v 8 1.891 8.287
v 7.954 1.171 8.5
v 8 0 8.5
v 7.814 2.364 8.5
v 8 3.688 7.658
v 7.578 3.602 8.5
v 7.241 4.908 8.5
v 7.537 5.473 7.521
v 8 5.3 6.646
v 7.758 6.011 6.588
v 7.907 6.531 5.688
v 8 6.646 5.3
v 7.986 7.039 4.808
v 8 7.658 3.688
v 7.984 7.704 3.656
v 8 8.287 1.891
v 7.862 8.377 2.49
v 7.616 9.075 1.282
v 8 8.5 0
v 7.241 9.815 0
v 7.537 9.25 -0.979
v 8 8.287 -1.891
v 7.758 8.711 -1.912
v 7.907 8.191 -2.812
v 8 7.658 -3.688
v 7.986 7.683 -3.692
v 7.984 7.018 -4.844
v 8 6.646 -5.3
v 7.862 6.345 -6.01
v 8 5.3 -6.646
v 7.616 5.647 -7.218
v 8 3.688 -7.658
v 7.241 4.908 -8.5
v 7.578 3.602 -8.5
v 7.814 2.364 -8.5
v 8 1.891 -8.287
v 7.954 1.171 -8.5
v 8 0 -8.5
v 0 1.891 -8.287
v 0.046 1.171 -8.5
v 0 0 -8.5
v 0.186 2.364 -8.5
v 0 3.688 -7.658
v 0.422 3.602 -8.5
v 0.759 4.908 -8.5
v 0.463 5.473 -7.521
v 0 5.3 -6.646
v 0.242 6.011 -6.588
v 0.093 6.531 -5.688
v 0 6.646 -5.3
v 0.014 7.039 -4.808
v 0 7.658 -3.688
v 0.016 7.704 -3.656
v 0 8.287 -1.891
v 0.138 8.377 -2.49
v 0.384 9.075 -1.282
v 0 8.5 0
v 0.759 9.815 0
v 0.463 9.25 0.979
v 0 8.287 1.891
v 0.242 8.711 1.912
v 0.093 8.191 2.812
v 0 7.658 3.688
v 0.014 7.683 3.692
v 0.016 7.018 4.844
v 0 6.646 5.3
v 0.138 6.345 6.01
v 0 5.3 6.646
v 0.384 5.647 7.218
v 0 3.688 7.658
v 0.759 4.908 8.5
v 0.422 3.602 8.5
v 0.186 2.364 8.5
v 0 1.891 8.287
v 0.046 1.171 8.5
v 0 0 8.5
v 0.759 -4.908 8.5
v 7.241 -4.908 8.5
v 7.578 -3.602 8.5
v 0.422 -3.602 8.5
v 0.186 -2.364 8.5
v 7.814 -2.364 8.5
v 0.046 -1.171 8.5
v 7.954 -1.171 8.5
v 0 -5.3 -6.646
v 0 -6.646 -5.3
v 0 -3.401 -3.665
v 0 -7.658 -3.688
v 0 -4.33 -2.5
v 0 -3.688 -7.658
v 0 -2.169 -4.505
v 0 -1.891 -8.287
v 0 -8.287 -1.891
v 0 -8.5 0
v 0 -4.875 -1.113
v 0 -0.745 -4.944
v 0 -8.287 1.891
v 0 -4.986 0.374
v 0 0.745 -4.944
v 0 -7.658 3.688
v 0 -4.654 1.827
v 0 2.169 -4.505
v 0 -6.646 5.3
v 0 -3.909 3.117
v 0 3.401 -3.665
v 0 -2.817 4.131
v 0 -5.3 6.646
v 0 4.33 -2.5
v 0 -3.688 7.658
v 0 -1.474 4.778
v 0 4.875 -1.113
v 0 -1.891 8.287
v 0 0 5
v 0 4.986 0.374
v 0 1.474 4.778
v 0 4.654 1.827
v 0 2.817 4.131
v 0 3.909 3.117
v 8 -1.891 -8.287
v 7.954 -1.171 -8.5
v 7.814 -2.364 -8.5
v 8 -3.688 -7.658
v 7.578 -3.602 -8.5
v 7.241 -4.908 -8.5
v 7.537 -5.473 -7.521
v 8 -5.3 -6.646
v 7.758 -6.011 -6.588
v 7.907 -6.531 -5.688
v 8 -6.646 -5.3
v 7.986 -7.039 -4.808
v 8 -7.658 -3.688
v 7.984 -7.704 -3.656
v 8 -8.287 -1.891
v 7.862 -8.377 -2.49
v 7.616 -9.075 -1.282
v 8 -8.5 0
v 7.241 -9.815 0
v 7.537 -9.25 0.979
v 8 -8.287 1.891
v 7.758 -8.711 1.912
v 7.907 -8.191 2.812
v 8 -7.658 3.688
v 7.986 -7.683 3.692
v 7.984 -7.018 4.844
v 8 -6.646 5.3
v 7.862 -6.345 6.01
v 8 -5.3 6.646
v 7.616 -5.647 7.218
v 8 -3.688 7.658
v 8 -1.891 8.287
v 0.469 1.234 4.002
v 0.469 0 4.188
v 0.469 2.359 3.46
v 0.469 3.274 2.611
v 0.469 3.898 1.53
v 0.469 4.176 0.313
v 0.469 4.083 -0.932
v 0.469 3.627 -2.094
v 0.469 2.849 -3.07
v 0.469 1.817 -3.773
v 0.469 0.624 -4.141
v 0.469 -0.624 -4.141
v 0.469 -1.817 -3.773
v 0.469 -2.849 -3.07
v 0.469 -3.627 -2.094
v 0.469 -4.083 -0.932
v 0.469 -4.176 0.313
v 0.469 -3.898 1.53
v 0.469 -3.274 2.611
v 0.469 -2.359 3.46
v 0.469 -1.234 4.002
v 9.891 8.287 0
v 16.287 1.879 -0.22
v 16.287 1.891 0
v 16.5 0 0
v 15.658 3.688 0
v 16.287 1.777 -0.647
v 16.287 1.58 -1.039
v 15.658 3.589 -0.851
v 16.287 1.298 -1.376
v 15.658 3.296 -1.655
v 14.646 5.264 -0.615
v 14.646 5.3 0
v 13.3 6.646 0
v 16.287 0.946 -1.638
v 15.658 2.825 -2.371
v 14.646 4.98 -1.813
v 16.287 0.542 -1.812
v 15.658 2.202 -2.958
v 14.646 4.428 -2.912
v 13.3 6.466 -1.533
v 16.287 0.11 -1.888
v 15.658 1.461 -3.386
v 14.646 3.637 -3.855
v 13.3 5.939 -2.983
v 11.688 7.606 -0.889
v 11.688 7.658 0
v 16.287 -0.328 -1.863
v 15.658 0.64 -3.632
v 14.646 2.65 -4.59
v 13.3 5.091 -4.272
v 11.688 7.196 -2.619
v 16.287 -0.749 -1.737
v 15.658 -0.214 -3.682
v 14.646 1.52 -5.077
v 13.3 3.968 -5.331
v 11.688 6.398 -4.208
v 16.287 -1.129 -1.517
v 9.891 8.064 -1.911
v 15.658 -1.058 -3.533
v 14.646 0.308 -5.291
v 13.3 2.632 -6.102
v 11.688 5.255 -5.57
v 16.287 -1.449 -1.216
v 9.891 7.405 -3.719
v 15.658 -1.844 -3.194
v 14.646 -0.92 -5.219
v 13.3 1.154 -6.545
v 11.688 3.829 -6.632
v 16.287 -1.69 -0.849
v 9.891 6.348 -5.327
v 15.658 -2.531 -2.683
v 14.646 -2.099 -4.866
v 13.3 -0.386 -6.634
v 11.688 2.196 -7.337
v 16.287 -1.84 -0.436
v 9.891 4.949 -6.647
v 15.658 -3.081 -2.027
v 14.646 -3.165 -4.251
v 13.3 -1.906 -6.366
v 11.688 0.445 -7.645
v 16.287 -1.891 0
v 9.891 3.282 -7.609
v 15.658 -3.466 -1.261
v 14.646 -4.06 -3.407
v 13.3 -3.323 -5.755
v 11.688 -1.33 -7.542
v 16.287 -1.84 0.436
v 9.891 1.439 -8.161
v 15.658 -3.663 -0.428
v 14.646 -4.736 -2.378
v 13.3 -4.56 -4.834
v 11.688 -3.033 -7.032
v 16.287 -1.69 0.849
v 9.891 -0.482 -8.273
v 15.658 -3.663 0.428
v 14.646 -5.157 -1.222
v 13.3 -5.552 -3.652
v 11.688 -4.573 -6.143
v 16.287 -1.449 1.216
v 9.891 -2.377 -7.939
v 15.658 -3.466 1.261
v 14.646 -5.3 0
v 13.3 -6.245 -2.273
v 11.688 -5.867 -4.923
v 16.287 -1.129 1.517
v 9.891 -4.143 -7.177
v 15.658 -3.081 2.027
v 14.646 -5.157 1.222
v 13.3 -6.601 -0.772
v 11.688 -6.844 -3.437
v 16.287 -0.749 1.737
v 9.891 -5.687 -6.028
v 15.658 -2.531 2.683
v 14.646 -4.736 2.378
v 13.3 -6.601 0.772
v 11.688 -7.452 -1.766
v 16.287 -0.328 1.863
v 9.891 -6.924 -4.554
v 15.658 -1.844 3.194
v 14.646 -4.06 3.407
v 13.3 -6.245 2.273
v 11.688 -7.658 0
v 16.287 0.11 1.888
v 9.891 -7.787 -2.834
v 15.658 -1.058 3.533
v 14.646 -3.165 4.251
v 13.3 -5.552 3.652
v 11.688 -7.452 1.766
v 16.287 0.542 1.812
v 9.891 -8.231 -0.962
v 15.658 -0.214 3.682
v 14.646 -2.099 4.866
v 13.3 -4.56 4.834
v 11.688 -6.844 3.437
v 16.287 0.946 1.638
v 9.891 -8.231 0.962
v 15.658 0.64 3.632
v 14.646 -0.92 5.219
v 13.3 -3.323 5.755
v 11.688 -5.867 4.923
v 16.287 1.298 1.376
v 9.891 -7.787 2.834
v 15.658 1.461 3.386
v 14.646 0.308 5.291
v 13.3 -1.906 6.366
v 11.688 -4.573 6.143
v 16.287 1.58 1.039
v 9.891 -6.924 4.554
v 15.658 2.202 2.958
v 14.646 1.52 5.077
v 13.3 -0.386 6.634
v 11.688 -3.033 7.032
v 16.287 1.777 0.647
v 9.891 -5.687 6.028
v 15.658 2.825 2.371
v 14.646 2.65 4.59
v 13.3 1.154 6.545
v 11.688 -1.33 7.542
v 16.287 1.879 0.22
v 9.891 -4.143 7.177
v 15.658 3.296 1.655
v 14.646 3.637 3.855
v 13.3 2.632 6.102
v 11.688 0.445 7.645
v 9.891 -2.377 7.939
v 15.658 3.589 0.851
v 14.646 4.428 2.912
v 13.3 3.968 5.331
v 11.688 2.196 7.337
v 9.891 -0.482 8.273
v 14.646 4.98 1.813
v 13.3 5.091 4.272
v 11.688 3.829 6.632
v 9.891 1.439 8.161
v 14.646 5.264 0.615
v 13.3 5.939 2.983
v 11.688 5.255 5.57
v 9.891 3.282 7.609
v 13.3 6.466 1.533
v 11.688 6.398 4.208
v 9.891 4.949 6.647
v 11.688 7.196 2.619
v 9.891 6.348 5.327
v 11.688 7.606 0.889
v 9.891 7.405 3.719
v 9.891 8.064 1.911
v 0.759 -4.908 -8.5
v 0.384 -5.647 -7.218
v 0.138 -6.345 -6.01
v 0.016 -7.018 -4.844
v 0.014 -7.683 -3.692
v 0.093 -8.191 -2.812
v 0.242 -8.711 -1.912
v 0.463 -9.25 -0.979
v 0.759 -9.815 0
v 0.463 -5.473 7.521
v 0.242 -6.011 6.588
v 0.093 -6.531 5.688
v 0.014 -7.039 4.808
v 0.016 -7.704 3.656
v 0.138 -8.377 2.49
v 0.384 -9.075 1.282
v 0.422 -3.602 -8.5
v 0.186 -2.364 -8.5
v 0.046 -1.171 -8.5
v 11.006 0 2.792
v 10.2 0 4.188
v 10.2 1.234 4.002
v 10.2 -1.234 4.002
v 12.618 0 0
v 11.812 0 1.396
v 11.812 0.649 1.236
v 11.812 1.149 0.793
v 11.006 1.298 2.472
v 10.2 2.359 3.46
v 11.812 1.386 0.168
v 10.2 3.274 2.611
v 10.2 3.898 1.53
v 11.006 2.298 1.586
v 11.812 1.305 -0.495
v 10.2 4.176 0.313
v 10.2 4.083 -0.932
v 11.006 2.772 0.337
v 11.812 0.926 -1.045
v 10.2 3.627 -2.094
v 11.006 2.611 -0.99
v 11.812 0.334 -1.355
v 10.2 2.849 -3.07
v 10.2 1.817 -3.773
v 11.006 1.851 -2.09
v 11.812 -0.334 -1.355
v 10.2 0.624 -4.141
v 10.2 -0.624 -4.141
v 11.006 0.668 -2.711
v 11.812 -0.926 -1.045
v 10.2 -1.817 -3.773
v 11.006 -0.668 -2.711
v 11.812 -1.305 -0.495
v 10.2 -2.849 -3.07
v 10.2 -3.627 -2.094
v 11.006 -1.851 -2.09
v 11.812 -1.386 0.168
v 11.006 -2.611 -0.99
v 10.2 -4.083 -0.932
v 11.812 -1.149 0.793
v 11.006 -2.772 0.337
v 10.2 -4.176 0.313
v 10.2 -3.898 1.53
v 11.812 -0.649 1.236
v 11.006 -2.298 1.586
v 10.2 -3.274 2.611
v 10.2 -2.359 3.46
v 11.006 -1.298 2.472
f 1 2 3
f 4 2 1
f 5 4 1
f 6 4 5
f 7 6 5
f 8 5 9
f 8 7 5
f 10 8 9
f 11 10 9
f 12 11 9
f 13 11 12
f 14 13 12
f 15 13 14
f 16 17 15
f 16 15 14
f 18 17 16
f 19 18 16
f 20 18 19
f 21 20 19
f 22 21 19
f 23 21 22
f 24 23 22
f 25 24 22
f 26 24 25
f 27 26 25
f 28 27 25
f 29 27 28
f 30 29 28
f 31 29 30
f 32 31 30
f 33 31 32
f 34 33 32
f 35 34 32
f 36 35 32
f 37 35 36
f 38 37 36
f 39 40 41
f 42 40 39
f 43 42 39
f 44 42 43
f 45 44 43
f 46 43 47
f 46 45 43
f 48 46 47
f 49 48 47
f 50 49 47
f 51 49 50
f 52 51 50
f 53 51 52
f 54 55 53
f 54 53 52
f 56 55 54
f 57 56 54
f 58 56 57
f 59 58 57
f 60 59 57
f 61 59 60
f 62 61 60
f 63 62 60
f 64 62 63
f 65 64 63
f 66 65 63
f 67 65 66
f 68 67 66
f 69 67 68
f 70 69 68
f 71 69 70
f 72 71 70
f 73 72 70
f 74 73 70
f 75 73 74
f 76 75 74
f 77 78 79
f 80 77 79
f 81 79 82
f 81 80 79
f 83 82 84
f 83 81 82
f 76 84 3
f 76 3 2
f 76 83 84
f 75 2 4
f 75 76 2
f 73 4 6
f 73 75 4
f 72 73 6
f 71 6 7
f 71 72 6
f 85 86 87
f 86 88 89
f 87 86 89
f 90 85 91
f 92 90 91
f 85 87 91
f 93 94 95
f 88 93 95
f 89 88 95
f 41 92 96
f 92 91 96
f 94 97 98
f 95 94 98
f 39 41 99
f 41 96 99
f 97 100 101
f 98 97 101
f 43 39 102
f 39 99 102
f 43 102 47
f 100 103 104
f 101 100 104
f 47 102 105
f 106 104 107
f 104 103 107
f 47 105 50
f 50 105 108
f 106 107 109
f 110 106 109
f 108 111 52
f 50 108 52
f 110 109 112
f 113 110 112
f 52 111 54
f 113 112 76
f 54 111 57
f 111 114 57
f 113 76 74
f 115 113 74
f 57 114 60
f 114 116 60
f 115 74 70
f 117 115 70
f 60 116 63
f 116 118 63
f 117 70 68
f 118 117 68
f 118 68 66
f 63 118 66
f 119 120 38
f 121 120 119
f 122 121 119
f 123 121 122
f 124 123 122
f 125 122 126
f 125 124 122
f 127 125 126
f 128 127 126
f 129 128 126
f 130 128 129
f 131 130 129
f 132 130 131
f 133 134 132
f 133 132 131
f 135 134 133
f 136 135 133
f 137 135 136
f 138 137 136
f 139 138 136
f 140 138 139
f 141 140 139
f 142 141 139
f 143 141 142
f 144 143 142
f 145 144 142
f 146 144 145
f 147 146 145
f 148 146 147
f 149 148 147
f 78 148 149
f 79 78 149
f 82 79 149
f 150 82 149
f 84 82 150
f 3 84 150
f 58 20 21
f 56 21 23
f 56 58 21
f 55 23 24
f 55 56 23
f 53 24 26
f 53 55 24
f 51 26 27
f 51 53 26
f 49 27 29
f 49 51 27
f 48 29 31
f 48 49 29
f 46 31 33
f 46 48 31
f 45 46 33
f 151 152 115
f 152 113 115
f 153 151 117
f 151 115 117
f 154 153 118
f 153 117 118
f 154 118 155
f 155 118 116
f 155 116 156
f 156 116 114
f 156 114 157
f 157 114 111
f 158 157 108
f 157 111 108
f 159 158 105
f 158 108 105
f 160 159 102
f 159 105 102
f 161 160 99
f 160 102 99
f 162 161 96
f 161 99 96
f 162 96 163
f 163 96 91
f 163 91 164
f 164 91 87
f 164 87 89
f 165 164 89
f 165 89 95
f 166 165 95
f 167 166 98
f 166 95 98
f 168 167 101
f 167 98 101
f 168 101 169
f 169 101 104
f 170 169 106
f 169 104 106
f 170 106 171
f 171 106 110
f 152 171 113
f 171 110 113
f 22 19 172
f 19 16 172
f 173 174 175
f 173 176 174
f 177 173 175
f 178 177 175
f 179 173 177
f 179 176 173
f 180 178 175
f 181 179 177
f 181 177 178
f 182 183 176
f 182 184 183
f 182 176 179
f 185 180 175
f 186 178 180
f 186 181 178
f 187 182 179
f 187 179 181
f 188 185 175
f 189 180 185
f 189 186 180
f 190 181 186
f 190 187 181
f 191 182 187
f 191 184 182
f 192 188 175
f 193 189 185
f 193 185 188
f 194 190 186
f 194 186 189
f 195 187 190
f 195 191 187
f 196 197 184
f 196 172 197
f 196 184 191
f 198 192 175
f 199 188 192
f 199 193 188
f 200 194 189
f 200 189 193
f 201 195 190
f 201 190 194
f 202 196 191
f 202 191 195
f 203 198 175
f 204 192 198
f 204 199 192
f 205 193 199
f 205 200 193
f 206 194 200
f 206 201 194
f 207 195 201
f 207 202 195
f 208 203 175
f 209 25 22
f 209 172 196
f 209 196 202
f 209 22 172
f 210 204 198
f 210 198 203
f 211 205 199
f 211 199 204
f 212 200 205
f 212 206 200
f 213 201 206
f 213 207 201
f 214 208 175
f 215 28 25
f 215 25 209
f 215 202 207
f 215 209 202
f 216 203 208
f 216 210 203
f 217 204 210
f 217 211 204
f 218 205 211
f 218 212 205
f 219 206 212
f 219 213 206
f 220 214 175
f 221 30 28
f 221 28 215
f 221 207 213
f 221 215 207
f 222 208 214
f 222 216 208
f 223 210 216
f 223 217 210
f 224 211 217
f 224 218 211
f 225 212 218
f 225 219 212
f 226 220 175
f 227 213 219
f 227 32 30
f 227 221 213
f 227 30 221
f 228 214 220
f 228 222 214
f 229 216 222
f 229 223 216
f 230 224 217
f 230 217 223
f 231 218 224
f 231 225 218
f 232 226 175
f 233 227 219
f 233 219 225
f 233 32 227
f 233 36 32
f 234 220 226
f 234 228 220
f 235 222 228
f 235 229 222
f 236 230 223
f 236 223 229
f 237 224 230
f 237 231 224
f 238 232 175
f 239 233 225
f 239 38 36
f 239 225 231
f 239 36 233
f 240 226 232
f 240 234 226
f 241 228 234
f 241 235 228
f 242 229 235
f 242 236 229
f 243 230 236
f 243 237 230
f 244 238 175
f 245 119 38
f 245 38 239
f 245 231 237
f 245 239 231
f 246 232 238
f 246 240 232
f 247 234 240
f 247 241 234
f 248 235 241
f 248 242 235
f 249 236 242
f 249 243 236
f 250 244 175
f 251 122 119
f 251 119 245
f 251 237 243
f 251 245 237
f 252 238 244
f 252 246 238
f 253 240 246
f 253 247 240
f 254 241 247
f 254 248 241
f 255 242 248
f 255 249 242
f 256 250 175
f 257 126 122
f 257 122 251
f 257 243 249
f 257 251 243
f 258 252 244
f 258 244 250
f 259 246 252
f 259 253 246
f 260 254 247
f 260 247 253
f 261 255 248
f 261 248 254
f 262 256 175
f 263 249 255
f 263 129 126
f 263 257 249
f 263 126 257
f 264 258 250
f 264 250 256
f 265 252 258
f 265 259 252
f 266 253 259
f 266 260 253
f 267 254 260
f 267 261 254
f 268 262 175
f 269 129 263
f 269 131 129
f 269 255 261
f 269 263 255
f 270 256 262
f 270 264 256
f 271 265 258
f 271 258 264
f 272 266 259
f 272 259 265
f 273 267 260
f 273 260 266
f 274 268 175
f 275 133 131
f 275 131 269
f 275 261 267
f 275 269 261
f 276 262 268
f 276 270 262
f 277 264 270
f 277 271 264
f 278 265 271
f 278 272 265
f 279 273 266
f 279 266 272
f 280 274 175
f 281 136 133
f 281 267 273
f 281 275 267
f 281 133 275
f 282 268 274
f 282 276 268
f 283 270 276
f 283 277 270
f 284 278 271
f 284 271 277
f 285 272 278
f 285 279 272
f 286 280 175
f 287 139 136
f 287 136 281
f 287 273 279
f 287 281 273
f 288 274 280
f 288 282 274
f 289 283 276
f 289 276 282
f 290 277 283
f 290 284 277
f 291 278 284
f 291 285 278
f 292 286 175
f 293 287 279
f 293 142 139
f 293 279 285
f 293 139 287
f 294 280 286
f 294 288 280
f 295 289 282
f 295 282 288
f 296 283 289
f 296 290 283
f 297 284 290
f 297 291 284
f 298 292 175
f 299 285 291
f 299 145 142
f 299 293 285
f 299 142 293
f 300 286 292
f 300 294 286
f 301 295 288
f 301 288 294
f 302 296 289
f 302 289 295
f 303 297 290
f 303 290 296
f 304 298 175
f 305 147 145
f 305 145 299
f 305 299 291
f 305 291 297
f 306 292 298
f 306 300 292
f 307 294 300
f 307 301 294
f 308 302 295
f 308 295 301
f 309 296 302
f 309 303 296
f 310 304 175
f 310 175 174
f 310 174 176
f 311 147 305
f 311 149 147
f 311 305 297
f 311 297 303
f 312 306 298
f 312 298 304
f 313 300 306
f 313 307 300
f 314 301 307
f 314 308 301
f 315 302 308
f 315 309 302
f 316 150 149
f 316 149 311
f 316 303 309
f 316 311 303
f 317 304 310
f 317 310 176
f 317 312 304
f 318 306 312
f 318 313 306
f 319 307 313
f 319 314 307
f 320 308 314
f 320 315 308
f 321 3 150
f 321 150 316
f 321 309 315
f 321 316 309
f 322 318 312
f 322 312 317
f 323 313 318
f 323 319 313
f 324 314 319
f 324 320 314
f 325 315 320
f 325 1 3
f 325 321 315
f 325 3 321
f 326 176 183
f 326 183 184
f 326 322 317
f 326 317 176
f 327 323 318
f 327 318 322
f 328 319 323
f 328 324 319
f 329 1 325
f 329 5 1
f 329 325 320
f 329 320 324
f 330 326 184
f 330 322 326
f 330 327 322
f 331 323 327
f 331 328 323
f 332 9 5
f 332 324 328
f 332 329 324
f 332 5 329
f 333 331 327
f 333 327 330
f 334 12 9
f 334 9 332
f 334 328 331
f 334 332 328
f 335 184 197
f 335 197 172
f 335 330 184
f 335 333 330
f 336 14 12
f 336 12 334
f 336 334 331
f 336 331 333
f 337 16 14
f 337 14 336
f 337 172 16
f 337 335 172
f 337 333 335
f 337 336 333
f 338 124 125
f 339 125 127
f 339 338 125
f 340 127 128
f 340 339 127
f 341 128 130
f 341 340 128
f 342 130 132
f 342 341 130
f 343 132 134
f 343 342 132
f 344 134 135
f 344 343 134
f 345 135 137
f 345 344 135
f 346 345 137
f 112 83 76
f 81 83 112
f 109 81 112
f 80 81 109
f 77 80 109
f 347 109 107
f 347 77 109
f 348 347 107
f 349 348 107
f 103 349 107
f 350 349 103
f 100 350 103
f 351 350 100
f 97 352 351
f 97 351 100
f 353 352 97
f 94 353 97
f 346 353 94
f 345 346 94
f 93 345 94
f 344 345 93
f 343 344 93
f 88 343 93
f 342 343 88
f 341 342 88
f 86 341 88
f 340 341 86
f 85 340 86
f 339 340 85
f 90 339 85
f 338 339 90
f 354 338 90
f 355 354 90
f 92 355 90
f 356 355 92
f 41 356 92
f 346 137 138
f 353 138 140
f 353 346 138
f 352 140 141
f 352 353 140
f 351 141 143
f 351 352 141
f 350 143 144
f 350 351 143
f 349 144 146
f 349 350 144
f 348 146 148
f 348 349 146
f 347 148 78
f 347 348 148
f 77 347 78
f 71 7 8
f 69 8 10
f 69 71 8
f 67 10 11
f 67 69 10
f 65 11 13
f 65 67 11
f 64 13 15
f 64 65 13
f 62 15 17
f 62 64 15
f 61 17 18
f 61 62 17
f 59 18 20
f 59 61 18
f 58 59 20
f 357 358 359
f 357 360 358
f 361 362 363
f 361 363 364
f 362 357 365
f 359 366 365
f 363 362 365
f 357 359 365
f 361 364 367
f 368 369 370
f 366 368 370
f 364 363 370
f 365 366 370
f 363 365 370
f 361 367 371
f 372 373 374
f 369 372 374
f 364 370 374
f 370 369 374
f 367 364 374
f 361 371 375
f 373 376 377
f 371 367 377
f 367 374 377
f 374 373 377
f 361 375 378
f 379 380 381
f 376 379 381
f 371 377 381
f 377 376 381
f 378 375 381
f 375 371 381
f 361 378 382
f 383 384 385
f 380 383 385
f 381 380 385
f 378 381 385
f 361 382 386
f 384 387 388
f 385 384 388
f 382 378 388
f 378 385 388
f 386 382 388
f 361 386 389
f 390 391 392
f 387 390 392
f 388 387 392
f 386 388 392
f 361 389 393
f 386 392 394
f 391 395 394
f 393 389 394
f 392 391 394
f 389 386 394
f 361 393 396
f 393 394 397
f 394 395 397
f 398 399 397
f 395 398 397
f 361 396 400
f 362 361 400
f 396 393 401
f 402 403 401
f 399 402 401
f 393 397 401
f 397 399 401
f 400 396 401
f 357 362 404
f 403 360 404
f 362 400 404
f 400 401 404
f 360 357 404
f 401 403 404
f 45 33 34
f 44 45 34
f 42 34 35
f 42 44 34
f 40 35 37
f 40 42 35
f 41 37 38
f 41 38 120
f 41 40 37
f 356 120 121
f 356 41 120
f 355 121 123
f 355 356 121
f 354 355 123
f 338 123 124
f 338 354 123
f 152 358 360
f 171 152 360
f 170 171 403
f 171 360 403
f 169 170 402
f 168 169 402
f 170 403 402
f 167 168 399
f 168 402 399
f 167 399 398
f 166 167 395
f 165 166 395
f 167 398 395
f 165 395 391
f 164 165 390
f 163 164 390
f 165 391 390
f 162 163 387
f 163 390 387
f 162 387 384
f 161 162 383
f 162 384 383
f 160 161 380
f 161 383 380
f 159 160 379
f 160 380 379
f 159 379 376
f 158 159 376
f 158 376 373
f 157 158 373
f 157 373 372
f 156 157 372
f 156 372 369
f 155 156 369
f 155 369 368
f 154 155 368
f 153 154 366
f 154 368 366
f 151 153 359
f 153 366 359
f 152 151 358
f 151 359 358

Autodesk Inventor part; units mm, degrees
ref_plane "YZ Plane" through (0, 0, 0) normal (1, 0, 0) x (0, 1, 0)
ref_plane "XZ Plane" through (0, 0, 0) normal (0, 1, 0) x (-1, 0, 0)
sketch "Sketch1" plane through (0, 0, 0) normal (1, 0, 0) x (0, 1, 0)
  line L0 (-4.9075, -8.5) -> (-9.815, 0)
  line L1 (-9.815, 0) -> (-4.9075, 8.5)
  line L2 (-4.9075, 8.5) -> (4.9075, 8.5)
  line L3 (4.9075, 8.5) -> (9.815, 0)
  line L4 (9.815, 0) -> (4.9075, -8.5)
  line L5 (4.9075, -8.5) -> (-4.9075, -8.5)
  point P0 (0, 0)
  point P1 (0, 0)
  dimension "d0" = 19.6299
extrude "Body" add sketch "Sketch1" along normal blind 8
sketch "Sketch2" plane through (0, 0, 0) normal (0, 0, 1) x (1, 0, 0)
  line L0 (8, 0) -> (16.5, 0)
  arc A0 (16.5, 0) -> (8, 8.5) centre (8, 0) ccw
  line L1 (8, 8.5) -> (8, 8.5)
  line L2 (8, -4.9075) -> (8, 4.9075) projected
  line L3 (8, 0) -> (8, 8.5)
  line L4 (5.9479, 0) -> (20.3125, 0) projected
  dimension "d8" = 8.5
  dimension "d9" = 8.5
revolve "Cap" add sketch "Sketch2" angle 360 about axis through (8, 0, 0) along (1, 0, 0)
sketch "Sketch3" plane through (0, 0, 0) normal (-1, 0, 0) x (0, 0, 1)
  line L0 (0, -13.7409) -> (0, 13.7409) projected
  line L1 (-11.9, 0) -> (11.9, 0) projected
  point P0 (0, 0)
hole "Thread" at (0, 0, 0) direction (1, 0, 0) diameter 8.376 depth 10.2 tip angle 120 thread size "M10x1.5" class "6H" standard "ISO Metric profile"
sketch "Sketch4" plane through (0, 0, 0) normal (0, 0, 1) x (1, 0, 0)
  line L0 (0, 4.9075) -> (0, 9.815) projected
  line L1 (0, 9.815) -> (8, 9.815) projected
  line L2 (8, 4.9075) -> (8, 9.815) projected
  line L3 (-1.6, 0) -> (9.6, 0) projected
  line L4 (0.7592, 9.815) -> (0, 8.5)
  line L5 (7.2408, 9.815) -> (8, 8.5)
  dimension "d3" = 17
  dimension "d4" = 30
  dimension "d5" = 17
  dimension "d6" = 30
revolve "Chamfer1" cut sketch "Sketch4" angle 360 about axis through (-10, 0, 0) along (1, 0, 0)
chamfer "Chamfer2" distance 0.8119 angle 30 1 edges at (0, 0, -4.188) measured on face at (0, -7.0214, 0.1683)
ref_plane "Work Plane1" through (5.1, 0, 0) normal (0, 0.866, -0.5) x (-1, 0, 0)
equation "\"d0\" = 1.1547 * SW"
equation "\"d1\" = SIH"
equation "\"d8\" = KR"
equation "\"d9\" = KOH1 - SIH"
equation "\"d11\" = GEL"
equation "\"d12\" = 1.02 * GEL"
equation "\"d3\" = SW0"
equation "\"d4\" = ANG1"
equation "\"d5\" = SW01"
equation "\"d6\" = ANG2"
equation "\"d14\" = -0.5 * GD1 + 0.5 * NND"
equation "\"d36\" = -0.5 * GD1 + 0.5 * NND"
equation "\"ANG1\" = 30deg"
equation "\"ANG2\" = ANG1"
equation "\"SIH\" = 8"
equation "\"KOH1\" = 16.5"
equation "\"GEL\" = 10"
equation "\"SW\" = 17"
equation "\"KR\" = 8.5"
equation "\"SW0\" = SW"
equation "\"SW01\" = SW"
equation "\"GUL\" = 0.541266 * PTC"
equation "\"TOA\" = 30deg"
equation "\"PTC\" = 1.5"
equation "\"E0\" = 1.155 * SW"
equation "\"GAL\" = 0.541266 * PTC"
equation "\"GD1\" = 8.376202"
equation "\"NND\" = 10"
properties part number "NF E 27-453 - M10" material "Steel, Mild"
